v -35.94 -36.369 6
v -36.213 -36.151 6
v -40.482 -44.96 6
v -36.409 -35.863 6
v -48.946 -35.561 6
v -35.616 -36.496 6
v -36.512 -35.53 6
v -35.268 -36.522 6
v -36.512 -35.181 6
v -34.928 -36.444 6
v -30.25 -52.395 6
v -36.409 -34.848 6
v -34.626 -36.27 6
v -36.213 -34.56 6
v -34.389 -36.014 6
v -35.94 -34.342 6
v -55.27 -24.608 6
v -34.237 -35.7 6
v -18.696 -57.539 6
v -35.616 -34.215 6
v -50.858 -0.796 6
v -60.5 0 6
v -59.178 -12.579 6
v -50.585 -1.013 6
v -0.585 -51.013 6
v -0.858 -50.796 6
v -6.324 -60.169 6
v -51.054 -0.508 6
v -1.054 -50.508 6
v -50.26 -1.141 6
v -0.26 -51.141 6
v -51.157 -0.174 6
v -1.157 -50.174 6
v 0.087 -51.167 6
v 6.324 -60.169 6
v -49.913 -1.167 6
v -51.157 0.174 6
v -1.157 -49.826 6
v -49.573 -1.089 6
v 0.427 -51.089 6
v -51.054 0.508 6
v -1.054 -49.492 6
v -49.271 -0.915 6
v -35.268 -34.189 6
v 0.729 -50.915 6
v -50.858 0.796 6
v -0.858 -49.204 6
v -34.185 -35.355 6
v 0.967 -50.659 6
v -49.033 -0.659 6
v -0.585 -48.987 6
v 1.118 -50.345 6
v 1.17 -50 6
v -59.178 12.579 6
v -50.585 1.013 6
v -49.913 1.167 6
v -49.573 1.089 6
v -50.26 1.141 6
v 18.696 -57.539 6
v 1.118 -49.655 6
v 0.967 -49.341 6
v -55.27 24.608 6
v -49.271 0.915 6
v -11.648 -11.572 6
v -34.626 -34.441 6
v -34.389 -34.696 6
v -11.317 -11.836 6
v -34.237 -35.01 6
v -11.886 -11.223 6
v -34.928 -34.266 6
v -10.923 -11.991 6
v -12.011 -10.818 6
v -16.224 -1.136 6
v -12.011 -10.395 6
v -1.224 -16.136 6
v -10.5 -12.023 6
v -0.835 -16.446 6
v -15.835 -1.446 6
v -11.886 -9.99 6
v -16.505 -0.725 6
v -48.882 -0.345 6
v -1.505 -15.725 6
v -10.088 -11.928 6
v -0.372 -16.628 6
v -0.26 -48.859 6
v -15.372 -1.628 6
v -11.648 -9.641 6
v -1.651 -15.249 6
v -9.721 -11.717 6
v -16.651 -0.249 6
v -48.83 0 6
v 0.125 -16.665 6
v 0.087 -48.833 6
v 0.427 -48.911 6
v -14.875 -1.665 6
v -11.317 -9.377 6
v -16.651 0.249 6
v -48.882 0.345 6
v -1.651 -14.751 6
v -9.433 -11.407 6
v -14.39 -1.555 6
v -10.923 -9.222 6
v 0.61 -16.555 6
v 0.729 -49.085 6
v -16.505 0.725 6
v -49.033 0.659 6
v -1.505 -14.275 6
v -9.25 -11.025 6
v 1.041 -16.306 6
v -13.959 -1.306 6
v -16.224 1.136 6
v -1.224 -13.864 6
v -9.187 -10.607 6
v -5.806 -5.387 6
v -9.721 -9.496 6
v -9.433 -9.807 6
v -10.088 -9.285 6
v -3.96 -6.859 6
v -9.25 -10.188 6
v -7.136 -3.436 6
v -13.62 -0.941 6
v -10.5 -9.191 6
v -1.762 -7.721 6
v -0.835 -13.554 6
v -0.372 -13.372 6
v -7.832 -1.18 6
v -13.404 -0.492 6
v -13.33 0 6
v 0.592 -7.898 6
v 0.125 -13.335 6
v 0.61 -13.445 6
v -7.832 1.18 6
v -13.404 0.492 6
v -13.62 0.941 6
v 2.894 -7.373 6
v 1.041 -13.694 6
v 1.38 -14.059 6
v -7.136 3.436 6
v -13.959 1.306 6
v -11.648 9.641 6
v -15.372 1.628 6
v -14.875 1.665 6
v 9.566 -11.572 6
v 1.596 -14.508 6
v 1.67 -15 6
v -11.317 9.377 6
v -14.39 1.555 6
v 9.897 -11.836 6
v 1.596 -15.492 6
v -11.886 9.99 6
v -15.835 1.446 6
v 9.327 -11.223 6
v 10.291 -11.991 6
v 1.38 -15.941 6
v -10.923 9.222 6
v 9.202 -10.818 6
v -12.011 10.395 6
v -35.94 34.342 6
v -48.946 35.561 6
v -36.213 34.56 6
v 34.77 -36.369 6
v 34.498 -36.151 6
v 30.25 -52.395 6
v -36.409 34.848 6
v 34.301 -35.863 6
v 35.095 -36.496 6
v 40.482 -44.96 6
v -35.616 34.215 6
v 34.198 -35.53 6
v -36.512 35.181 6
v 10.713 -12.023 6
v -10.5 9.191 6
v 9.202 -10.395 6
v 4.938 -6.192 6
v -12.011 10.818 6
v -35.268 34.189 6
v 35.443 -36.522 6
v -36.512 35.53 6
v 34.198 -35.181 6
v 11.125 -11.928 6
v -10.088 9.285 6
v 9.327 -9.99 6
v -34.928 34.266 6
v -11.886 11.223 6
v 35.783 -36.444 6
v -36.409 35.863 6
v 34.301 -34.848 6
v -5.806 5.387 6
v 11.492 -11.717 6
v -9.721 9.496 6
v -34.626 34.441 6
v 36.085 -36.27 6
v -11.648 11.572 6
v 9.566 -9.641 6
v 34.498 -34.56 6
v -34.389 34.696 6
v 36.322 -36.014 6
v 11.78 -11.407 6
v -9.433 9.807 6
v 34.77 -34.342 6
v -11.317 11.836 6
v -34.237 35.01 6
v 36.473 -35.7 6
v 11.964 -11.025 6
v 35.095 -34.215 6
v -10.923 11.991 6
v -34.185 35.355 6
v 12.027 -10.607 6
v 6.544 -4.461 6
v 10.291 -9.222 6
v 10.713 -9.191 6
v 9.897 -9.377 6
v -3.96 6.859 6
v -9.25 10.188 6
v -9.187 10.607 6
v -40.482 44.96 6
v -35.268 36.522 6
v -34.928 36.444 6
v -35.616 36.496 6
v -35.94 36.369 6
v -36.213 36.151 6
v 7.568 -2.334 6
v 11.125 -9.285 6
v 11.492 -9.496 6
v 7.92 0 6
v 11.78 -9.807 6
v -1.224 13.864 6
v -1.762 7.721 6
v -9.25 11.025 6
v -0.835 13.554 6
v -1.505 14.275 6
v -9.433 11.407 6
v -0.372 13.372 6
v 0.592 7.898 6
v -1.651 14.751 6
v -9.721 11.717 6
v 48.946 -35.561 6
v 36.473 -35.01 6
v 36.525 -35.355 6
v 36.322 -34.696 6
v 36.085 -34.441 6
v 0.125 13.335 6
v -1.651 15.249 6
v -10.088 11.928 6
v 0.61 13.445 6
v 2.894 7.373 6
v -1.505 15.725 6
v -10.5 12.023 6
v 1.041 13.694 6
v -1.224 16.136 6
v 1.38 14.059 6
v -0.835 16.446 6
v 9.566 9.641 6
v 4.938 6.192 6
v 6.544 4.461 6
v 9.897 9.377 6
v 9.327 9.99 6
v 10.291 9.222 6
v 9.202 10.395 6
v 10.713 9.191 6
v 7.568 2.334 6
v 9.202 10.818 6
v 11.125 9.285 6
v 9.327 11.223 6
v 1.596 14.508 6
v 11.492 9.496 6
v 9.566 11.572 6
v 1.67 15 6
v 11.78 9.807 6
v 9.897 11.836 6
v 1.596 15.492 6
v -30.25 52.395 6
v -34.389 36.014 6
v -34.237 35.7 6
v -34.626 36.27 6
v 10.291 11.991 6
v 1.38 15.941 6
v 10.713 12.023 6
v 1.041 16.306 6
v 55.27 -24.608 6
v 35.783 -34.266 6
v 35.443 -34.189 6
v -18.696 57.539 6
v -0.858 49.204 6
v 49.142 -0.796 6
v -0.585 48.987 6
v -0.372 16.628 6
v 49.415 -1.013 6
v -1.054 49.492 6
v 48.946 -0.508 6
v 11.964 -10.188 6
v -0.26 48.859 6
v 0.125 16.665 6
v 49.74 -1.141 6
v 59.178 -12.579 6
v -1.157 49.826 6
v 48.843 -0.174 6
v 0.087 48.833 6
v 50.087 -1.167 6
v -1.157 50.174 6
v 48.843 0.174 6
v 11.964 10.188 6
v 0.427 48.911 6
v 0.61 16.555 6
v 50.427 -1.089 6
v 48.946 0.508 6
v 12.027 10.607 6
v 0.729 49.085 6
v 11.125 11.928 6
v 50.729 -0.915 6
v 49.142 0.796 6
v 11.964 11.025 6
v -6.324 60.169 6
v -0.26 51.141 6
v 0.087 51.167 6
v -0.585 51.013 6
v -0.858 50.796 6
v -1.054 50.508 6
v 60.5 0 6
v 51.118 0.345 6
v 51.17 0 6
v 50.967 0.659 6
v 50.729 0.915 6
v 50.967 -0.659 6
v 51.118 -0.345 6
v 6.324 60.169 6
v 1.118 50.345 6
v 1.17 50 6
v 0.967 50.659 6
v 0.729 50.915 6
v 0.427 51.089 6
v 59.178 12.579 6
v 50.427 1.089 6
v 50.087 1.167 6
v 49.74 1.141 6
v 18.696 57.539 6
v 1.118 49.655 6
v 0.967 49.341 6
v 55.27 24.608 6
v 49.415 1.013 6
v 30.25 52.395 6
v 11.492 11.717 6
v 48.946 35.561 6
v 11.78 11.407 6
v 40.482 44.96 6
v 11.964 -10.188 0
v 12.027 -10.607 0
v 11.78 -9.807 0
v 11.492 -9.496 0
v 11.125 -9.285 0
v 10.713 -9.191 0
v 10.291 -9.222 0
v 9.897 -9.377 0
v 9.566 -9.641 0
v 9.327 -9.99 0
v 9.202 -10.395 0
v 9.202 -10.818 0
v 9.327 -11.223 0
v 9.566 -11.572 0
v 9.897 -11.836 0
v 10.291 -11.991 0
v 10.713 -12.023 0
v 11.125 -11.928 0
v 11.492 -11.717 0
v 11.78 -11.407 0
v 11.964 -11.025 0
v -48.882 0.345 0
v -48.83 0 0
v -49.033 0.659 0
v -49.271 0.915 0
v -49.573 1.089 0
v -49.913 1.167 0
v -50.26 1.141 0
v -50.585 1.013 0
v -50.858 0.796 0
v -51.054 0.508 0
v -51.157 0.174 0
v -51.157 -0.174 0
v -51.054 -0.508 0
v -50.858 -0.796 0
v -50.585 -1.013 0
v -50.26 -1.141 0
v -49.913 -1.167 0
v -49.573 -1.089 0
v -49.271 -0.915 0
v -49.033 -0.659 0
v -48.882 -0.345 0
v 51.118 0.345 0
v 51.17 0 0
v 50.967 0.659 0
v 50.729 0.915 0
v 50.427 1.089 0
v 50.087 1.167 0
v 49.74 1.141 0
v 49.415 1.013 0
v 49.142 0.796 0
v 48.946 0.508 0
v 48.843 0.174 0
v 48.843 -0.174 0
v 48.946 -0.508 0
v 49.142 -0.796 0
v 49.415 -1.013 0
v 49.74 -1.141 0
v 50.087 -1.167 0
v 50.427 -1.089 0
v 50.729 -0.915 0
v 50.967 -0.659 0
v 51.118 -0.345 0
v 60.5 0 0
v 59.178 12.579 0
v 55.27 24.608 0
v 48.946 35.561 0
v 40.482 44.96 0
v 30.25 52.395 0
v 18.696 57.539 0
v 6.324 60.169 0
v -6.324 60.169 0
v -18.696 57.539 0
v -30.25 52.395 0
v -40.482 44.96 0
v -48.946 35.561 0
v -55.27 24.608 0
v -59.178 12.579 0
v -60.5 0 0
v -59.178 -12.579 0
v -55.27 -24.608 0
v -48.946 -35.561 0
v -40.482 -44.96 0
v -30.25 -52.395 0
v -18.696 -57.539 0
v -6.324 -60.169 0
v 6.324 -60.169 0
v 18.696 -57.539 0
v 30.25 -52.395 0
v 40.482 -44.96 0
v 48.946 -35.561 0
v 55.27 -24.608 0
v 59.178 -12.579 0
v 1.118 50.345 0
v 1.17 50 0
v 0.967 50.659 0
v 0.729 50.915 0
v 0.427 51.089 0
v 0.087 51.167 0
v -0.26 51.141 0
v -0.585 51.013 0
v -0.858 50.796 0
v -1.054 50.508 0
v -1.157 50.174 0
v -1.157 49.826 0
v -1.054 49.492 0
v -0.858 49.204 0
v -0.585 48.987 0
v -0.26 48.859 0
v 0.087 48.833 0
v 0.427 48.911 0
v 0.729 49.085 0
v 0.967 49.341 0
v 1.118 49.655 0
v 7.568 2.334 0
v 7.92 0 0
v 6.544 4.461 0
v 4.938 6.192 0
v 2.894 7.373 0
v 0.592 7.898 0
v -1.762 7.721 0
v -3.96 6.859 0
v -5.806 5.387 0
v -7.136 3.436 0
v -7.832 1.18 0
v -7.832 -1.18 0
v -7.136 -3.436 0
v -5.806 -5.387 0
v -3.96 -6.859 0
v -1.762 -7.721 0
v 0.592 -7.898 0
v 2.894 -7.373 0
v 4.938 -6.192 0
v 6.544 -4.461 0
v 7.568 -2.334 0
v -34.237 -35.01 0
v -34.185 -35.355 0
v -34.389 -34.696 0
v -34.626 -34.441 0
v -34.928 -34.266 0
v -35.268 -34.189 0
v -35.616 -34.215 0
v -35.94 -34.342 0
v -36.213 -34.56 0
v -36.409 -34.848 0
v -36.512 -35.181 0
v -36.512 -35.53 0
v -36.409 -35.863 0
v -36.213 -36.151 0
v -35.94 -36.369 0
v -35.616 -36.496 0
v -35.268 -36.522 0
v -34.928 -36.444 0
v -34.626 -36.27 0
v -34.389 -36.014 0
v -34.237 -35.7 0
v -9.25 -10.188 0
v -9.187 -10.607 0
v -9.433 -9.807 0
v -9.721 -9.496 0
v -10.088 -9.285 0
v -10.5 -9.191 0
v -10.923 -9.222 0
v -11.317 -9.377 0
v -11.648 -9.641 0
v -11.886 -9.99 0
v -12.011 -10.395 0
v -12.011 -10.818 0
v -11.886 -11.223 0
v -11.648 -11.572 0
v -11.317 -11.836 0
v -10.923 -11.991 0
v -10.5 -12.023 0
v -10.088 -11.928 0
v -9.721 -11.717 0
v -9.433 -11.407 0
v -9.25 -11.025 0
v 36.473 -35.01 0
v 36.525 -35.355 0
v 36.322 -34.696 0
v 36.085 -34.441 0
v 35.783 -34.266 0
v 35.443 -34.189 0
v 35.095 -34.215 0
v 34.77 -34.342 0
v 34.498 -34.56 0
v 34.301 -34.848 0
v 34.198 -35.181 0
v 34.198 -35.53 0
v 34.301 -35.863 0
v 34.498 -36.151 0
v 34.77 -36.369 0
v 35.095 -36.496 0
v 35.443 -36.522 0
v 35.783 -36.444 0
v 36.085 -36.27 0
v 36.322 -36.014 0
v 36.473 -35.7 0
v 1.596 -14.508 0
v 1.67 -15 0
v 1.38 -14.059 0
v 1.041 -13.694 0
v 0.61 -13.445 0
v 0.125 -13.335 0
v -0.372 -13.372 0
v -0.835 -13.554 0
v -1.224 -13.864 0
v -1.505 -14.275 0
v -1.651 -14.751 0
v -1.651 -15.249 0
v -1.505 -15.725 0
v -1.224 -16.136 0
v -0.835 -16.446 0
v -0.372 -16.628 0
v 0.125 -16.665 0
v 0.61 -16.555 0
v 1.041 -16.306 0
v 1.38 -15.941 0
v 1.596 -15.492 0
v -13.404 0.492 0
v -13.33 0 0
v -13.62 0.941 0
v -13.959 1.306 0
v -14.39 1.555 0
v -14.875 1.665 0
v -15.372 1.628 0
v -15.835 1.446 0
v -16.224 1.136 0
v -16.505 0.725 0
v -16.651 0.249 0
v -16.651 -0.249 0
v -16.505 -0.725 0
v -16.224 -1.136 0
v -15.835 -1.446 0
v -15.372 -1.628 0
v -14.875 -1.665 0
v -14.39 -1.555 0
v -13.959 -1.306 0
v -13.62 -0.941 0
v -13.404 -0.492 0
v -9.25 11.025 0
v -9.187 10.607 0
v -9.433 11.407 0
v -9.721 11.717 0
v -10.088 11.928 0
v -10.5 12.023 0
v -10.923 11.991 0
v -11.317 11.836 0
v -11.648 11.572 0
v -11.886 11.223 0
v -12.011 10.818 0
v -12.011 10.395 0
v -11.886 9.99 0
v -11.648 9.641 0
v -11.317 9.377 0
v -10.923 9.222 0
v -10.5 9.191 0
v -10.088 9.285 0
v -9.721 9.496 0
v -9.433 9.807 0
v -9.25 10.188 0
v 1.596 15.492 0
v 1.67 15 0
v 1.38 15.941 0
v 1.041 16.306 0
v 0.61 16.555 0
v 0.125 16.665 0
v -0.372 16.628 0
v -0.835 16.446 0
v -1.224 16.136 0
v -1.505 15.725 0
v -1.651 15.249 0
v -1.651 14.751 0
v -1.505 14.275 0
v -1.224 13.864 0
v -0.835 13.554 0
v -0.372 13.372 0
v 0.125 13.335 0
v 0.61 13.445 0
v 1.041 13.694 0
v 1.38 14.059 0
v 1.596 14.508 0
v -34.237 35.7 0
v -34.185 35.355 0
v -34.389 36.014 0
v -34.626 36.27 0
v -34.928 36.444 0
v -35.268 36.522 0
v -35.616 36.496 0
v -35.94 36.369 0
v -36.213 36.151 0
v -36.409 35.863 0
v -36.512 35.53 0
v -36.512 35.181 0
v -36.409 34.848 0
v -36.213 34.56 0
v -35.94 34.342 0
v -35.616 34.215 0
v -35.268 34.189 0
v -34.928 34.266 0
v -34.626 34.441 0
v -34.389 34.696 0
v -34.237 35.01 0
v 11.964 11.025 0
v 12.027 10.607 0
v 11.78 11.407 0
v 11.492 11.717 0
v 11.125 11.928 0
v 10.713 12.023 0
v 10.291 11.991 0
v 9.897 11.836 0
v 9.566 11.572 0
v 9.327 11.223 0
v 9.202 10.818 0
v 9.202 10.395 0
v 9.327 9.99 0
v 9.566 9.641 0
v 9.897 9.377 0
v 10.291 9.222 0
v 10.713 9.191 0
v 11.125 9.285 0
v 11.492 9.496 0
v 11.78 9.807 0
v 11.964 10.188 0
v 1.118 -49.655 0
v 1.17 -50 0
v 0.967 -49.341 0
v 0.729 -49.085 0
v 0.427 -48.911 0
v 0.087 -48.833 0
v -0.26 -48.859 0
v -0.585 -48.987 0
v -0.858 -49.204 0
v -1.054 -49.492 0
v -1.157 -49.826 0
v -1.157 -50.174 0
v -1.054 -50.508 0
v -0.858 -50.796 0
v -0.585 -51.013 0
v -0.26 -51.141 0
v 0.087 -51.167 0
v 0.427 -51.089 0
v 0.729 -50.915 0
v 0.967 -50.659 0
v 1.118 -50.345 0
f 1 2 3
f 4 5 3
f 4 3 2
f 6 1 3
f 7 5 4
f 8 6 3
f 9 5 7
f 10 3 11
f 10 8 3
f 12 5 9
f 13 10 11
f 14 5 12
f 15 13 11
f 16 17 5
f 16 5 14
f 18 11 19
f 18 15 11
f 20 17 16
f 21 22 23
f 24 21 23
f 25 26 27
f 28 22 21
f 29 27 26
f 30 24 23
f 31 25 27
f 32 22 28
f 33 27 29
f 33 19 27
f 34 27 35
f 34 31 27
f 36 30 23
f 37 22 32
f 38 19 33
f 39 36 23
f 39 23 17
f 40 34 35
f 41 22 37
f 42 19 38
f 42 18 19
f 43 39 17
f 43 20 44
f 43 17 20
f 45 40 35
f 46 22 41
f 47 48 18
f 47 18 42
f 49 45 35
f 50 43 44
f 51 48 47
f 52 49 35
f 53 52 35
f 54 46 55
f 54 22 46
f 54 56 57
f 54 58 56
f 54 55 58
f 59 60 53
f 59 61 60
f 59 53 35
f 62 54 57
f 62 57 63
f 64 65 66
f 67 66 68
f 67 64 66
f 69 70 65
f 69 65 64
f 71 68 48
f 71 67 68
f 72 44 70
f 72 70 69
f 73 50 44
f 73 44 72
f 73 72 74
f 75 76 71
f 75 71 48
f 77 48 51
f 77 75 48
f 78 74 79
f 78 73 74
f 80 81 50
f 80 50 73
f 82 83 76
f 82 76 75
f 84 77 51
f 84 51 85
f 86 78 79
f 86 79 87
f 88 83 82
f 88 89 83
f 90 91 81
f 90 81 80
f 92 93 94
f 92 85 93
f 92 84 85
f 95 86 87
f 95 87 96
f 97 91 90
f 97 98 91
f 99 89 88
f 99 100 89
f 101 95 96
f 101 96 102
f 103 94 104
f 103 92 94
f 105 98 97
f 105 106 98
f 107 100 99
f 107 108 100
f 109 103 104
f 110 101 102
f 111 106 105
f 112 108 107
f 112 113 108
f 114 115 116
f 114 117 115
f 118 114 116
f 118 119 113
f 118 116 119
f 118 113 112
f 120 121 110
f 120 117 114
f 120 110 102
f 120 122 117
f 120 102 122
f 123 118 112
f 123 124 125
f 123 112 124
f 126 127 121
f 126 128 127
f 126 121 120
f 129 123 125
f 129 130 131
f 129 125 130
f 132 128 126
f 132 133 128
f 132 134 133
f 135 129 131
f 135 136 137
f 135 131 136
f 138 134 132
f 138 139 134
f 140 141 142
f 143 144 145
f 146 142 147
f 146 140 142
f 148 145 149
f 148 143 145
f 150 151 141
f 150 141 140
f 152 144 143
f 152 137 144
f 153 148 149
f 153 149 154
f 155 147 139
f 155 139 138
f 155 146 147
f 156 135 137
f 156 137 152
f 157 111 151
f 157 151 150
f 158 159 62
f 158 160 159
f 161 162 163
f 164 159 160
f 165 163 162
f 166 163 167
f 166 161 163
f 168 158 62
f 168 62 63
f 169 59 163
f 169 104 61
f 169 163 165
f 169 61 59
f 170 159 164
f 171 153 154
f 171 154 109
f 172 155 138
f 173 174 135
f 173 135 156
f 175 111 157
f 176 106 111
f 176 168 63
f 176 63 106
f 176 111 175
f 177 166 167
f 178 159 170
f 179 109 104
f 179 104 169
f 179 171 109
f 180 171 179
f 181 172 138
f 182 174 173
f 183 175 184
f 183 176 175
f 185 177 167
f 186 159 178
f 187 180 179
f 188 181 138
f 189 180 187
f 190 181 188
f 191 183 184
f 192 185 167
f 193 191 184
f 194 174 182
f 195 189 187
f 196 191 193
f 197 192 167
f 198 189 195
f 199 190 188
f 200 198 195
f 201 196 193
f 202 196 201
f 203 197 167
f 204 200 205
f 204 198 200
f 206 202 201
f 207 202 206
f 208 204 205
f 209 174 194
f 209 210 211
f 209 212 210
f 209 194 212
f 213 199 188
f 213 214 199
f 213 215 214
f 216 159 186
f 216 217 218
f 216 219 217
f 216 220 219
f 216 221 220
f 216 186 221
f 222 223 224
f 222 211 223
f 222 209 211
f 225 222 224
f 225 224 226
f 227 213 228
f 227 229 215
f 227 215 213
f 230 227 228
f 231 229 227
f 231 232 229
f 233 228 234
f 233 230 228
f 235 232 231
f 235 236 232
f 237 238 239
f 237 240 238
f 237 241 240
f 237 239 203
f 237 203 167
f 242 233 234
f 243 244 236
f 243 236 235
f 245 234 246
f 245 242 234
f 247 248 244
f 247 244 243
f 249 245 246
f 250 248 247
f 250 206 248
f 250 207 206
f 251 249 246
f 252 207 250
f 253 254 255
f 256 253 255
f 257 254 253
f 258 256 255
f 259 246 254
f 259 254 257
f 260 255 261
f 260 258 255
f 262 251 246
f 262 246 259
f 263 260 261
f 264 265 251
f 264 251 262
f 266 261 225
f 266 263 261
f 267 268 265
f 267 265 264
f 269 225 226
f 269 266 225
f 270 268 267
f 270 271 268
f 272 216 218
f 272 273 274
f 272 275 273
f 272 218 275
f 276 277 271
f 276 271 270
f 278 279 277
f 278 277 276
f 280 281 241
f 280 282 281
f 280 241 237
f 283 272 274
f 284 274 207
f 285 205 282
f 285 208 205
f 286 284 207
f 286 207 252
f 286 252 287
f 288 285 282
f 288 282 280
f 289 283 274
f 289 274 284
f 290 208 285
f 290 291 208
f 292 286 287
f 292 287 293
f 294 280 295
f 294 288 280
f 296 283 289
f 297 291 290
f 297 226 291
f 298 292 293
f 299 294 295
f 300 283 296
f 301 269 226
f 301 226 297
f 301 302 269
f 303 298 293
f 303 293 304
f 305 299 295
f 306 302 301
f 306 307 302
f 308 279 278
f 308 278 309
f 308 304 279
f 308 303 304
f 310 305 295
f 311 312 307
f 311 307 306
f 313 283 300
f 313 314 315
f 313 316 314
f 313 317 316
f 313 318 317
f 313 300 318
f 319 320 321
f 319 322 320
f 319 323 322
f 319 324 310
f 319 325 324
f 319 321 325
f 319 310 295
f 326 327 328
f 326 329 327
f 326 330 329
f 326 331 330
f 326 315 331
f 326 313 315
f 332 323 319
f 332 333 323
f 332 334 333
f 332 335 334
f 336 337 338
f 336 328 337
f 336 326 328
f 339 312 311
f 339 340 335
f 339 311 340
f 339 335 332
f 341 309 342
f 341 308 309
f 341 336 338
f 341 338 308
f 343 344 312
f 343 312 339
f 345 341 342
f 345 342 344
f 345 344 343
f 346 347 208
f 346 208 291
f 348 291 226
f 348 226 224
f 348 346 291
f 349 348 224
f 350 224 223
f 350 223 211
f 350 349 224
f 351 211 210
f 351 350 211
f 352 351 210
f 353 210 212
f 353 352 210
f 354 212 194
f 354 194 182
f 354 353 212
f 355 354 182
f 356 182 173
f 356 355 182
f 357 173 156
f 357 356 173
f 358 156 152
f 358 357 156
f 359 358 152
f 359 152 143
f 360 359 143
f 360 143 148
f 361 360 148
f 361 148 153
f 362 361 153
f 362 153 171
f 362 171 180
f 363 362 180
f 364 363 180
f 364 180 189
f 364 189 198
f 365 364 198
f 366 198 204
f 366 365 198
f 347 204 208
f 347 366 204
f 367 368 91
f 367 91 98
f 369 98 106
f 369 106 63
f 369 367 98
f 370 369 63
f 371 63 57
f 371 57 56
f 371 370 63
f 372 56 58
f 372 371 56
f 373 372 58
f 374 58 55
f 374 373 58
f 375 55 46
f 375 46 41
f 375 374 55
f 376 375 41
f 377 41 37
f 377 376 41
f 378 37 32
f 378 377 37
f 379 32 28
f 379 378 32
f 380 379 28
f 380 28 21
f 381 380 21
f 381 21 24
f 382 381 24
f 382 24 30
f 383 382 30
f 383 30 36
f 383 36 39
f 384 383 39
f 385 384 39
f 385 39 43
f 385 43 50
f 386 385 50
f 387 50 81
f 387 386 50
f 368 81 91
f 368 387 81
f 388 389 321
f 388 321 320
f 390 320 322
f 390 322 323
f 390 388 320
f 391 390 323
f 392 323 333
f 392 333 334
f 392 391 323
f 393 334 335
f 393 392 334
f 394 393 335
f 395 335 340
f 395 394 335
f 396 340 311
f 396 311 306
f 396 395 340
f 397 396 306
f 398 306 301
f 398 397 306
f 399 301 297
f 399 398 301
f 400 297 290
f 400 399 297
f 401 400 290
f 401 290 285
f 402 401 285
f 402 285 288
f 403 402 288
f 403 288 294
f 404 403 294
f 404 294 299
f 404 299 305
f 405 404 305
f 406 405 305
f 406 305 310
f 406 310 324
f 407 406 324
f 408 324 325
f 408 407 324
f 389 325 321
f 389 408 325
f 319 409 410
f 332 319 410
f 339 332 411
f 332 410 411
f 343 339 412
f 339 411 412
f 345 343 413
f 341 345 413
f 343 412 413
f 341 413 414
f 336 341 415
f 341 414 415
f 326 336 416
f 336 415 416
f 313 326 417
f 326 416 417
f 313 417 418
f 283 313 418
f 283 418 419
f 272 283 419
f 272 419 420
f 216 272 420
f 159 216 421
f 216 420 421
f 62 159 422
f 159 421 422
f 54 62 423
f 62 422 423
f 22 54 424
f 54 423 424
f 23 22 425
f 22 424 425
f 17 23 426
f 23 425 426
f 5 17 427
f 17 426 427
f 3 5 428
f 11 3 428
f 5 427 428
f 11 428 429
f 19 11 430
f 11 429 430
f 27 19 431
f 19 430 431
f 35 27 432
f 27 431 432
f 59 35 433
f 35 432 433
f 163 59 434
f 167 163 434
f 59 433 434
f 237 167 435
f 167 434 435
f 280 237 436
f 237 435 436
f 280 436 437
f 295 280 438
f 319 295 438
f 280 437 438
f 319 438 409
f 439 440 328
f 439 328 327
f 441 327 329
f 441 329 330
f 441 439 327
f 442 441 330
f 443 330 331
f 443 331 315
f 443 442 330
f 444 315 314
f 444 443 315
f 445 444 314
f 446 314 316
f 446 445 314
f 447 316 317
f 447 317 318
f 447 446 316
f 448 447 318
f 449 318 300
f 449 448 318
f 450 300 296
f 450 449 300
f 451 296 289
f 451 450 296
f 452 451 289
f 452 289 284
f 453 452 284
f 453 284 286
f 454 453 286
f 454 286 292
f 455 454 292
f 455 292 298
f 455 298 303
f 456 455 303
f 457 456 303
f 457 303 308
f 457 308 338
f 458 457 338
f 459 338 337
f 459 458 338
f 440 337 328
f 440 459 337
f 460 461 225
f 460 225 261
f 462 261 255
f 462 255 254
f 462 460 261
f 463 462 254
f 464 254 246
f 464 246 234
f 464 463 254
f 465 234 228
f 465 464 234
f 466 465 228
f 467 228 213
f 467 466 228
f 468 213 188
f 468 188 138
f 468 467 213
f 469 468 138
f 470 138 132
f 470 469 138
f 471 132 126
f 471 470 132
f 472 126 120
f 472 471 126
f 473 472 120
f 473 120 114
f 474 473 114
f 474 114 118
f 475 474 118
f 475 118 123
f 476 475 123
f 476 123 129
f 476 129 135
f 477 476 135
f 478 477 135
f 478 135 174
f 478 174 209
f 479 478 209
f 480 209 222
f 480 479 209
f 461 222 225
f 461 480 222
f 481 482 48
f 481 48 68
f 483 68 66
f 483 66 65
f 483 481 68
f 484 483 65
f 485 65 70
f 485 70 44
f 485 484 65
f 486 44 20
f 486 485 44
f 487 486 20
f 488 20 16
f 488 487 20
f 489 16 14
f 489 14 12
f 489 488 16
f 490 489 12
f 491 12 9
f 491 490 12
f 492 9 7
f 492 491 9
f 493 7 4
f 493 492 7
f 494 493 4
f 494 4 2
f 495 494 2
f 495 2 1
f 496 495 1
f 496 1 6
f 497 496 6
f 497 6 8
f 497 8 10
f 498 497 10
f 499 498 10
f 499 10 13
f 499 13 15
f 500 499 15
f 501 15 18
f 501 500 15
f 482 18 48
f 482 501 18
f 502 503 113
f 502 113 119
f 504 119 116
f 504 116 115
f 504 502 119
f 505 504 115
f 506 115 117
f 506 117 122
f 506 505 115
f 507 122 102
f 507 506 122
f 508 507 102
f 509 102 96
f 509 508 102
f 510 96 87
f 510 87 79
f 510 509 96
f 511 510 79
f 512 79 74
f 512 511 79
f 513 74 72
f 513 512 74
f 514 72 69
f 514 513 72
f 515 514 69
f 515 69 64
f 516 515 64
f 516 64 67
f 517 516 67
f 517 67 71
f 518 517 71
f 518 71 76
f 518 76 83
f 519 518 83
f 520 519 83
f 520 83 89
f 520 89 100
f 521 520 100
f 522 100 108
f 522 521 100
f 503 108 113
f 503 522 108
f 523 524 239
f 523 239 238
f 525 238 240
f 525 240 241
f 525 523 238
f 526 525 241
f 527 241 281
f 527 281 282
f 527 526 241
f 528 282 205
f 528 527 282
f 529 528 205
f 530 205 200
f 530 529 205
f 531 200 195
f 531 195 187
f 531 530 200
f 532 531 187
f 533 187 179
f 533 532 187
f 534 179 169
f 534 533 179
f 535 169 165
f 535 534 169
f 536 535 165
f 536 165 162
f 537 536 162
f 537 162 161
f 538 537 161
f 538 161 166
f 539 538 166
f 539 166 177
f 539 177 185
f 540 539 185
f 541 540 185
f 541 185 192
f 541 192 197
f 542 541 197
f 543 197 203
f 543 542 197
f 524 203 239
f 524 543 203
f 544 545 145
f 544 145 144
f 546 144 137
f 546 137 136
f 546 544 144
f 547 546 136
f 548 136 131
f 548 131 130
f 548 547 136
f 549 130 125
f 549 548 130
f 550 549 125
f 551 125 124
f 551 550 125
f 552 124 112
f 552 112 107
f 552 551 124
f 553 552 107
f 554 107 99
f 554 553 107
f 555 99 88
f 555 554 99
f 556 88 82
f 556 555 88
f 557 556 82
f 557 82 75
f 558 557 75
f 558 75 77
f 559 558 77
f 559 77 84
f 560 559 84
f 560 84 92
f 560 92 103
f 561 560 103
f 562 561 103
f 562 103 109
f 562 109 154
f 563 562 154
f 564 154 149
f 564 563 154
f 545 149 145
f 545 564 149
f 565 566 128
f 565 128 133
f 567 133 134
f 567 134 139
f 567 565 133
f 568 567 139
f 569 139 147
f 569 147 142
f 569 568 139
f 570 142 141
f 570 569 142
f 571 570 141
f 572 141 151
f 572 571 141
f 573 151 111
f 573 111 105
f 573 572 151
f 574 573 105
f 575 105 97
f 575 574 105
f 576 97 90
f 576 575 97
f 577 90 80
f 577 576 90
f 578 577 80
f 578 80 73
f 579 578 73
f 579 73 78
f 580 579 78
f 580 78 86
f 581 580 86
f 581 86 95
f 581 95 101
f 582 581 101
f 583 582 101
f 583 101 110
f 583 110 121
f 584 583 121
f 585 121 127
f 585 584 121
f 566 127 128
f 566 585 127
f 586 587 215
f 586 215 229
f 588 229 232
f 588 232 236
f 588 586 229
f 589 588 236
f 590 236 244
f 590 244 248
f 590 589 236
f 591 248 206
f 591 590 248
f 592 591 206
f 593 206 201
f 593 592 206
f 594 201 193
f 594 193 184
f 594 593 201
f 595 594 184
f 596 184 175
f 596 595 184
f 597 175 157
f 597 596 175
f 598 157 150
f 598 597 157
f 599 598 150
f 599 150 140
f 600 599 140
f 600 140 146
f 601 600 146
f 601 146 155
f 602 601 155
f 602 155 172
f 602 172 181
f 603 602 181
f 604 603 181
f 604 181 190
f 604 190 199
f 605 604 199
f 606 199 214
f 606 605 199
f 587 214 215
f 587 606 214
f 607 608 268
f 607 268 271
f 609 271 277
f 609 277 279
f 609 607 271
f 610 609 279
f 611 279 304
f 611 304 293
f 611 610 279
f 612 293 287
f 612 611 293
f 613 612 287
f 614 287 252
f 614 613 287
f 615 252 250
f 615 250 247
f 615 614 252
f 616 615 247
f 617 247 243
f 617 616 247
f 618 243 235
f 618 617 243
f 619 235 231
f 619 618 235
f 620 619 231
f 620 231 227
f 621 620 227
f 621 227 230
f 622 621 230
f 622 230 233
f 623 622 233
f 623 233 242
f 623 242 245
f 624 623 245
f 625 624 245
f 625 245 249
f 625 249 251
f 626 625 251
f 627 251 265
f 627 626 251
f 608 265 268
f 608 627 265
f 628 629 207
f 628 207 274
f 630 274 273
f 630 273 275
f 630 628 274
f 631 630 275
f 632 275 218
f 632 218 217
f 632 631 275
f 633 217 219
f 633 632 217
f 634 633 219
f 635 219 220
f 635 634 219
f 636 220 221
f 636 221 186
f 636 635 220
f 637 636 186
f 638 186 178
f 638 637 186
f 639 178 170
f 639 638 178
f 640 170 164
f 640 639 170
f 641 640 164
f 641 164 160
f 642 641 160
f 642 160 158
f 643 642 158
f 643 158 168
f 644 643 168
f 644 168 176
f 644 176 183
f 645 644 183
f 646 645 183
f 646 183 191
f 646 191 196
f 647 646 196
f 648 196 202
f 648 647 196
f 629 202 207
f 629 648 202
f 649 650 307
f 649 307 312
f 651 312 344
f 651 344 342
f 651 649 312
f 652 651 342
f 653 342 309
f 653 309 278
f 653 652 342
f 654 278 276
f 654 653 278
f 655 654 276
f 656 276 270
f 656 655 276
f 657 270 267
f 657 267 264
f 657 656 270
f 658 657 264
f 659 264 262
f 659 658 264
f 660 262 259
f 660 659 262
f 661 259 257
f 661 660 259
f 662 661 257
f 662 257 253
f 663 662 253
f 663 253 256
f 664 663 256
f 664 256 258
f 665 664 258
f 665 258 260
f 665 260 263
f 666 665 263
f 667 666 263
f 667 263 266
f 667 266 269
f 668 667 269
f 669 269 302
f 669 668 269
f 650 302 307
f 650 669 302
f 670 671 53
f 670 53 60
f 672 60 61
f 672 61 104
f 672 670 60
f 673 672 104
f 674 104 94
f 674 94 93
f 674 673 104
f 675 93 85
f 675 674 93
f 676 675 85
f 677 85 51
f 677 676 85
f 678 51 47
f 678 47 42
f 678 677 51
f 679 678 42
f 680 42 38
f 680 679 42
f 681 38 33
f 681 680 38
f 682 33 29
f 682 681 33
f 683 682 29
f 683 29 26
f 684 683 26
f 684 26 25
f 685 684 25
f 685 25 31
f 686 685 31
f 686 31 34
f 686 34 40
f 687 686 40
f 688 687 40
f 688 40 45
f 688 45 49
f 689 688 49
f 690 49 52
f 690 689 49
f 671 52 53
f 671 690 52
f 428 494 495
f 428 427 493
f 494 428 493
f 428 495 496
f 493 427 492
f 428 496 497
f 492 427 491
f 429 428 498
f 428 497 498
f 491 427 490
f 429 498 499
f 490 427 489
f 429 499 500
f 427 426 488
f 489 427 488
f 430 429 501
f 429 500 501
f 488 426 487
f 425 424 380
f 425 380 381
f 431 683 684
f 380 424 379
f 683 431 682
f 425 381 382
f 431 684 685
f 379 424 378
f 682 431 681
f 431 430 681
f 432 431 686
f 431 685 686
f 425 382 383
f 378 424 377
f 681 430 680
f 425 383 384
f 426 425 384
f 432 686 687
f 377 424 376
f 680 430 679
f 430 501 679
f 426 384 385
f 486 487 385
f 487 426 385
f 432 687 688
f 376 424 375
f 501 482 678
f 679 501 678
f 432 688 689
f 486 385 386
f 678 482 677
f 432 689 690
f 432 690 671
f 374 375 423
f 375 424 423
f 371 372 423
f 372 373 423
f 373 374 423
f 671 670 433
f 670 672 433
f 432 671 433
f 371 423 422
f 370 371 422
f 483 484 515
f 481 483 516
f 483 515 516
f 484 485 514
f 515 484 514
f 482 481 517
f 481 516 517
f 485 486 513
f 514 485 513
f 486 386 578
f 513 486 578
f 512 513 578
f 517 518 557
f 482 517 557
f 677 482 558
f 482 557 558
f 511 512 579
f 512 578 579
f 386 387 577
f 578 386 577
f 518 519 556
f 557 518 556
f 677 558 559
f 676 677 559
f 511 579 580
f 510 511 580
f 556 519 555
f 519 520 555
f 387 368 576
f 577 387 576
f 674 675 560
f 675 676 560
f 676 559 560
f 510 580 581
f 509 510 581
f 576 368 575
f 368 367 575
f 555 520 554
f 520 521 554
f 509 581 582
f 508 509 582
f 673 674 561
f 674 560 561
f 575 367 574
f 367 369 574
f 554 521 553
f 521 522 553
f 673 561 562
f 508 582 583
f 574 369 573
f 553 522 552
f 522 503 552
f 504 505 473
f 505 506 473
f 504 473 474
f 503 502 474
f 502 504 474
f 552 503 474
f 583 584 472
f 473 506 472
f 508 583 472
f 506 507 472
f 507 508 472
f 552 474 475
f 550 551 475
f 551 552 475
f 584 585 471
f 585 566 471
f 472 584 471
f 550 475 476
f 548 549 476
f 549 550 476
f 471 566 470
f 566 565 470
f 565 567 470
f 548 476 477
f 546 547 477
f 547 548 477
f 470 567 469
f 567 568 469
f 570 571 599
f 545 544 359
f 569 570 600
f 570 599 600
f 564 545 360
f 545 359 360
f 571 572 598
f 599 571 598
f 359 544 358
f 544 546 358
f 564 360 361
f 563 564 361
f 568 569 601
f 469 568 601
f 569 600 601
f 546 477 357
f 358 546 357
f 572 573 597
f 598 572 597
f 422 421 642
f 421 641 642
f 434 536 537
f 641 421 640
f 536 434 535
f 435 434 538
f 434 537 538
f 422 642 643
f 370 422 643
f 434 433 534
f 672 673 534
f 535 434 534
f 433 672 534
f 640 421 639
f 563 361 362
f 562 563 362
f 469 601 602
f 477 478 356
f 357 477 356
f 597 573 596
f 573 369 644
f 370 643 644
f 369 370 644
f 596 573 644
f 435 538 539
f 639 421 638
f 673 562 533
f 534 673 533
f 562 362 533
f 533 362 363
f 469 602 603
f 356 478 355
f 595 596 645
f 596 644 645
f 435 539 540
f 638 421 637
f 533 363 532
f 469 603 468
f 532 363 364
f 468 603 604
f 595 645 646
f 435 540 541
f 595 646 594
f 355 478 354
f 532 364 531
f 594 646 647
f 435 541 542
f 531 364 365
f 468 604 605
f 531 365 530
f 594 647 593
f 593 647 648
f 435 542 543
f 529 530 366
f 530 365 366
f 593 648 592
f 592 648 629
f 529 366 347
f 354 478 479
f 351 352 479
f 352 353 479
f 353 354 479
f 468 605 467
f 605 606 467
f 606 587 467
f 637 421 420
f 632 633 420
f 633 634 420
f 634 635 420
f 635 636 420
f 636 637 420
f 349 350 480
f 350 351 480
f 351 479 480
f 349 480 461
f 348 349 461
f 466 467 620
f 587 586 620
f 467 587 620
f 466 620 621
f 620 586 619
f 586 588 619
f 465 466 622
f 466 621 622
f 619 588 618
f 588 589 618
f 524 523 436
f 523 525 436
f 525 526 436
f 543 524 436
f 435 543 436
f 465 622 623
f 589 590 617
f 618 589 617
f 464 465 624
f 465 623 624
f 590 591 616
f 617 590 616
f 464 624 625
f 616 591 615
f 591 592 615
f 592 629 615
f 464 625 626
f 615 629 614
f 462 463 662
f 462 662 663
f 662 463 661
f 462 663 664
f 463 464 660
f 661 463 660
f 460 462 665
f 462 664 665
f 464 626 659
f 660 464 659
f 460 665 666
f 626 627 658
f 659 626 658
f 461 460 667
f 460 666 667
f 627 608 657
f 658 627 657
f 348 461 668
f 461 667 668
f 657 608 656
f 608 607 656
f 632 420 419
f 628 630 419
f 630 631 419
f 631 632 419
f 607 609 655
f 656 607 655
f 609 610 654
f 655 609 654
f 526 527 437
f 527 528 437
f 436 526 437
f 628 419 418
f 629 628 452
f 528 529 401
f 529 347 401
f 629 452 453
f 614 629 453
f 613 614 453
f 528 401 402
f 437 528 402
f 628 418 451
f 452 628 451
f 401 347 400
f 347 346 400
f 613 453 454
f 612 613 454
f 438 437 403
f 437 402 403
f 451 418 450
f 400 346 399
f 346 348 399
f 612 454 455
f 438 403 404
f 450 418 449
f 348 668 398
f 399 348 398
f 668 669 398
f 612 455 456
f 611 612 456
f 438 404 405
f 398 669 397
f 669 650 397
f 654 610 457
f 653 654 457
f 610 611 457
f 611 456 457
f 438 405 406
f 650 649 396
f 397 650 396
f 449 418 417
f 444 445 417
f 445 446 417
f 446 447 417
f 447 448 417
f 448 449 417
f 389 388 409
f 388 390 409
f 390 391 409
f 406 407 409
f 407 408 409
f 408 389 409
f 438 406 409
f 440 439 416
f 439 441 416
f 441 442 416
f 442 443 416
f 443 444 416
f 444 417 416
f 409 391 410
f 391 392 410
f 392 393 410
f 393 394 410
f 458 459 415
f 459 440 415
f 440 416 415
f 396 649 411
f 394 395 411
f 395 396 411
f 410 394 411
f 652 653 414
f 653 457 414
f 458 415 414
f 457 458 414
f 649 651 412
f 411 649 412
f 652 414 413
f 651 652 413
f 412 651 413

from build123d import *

# Parameters (mm, degrees)
SKETCH1_R           = 60.5
SKETCH1_R_2         = 1.25
SKETCH1_R_3         = 8
SKETCH1_R_4         = 1.75
SKETCH1_R_5         = 1.5
BOSS_EXTRUDE1_DEPTH = 6
MOVE_FACE1_BY       = 0.08
MOVE_FACE1_2_BY     = 0.08
MOVE_FACE1_3_BY     = 0.08
MOVE_FACE1_4_BY     = 0.08
MOVE_FACE1_5_BY     = 0.08
MOVE_FACE1_6_BY     = 0.08
MOVE_FACE1_7_BY     = 0.08
MOVE_FACE1_8_BY     = 0.08
MOVE_FACE1_9_BY     = 0.08
MOVE_FACE1_10_BY    = 0.08
MOVE_FACE1_11_BY    = 0.08
MOVE_FACE1_12_BY    = 0.08
MOVE_FACE1_13_BY    = 0.08
MOVE_FACE1_14_BY    = 0.08
MOVE_FACE1_15_BY    = 0.08


with BuildPart() as part:
    # Sketch1 → Boss-Extrude1 (new body)
    with BuildSketch(Plane.XY):
        Circle(SKETCH1_R)
        with Locations((35.355339059, -35.355339059)):
            Circle(SKETCH1_R_2, mode=Mode.SUBTRACT)
        Circle(SKETCH1_R_3, mode=Mode.SUBTRACT)
        with Locations((0, -15)):
            Circle(SKETCH1_R_4, mode=Mode.SUBTRACT)
        with Locations((10.606601718, -10.606601718)):
            Circle(SKETCH1_R_5, mode=Mode.SUBTRACT)
        with Locations((0, -50)):
            Circle(SKETCH1_R_2, mode=Mode.SUBTRACT)
        with Locations((-15, 0)):
            Circle(SKETCH1_R_4, mode=Mode.SUBTRACT)
        with Locations((-10.606601718, -10.606601718)):
            Circle(SKETCH1_R_5, mode=Mode.SUBTRACT)
        with Locations((0, 15)):
            Circle(SKETCH1_R_4, mode=Mode.SUBTRACT)
        with Locations((-10.606601718, 10.606601718)):
            Circle(SKETCH1_R_5, mode=Mode.SUBTRACT)
        with Locations((10.606601718, 10.606601718)):
            Circle(SKETCH1_R_5, mode=Mode.SUBTRACT)
        with Locations((-35.355339059, -35.355339059)):
            Circle(SKETCH1_R_2, mode=Mode.SUBTRACT)
        with Locations((-50, 0)):
            Circle(SKETCH1_R_2, mode=Mode.SUBTRACT)
        with Locations((-35.355339059, 35.355339059)):
            Circle(SKETCH1_R_2, mode=Mode.SUBTRACT)
        with Locations((0, 50)):
            Circle(SKETCH1_R_2, mode=Mode.SUBTRACT)
        with Locations((50, 0)):
            Circle(SKETCH1_R_2, mode=Mode.SUBTRACT)
    extrude(amount=BOSS_EXTRUDE1_DEPTH)

    # Move Face1: a curved face moved outward by 0.08
    add(Solid.thicken(part.faces().sort_by_distance((34.105339059, -35.355339059, 3))[0], MOVE_FACE1_BY))

    # Move Face1 2: a curved face moved outward by 0.08
    add(Solid.thicken(part.faces().sort_by_distance((-8, 0, 3))[0], MOVE_FACE1_2_BY))

    # Move Face1 3: a curved face moved outward by 0.08
    add(Solid.thicken(part.faces().sort_by_distance((-1.75, -15, 3))[0], MOVE_FACE1_3_BY))

    # Move Face1 4: a curved face moved outward by 0.08
    add(Solid.thicken(part.faces().sort_by_distance((9.106601718, -10.606601718, 3))[0], MOVE_FACE1_4_BY))

    # Move Face1 5: a curved face moved outward by 0.08
    add(Solid.thicken(part.faces().sort_by_distance((-1.25, -50, 3))[0], MOVE_FACE1_5_BY))

    # Move Face1 6: a curved face moved outward by 0.08
    add(Solid.thicken(part.faces().sort_by_distance((-36.605339059, -35.355339059, 3))[0], MOVE_FACE1_6_BY))

    # Move Face1 7: a curved face moved outward by 0.08
    add(Solid.thicken(part.faces().sort_by_distance((-16.75, 0, 3))[0], MOVE_FACE1_7_BY))

    # Move Face1 8: a curved face moved outward by 0.08
    add(Solid.thicken(part.faces().sort_by_distance((-12.106601718, -10.606601718, 3))[0], MOVE_FACE1_8_BY))

    # Move Face1 9: a curved face moved outward by 0.08
    add(Solid.thicken(part.faces().sort_by_distance((-1.75, 15, 3))[0], MOVE_FACE1_9_BY))

    # Move Face1 10: a curved face moved outward by 0.08
    add(Solid.thicken(part.faces().sort_by_distance((-12.106601718, 10.606601718, 3))[0], MOVE_FACE1_10_BY))

    # Move Face1 11: a curved face moved outward by 0.08
    add(Solid.thicken(part.faces().sort_by_distance((9.106601718, 10.606601718, 3))[0], MOVE_FACE1_11_BY))

    # Move Face1 12: a curved face moved outward by 0.08
    add(Solid.thicken(part.faces().sort_by_distance((-51.25, 0, 3))[0], MOVE_FACE1_12_BY))

    # Move Face1 13: a curved face moved outward by 0.08
    add(Solid.thicken(part.faces().sort_by_distance((-36.605339059, 35.355339059, 3))[0], MOVE_FACE1_13_BY))

    # Move Face1 14: a curved face moved outward by 0.08
    add(Solid.thicken(part.faces().sort_by_distance((-1.25, 50, 3))[0], MOVE_FACE1_14_BY))

    # Move Face1 15: a curved face moved outward by 0.08
    add(Solid.thicken(part.faces().sort_by_distance((48.75, 0, 3))[0], MOVE_FACE1_15_BY))


solid = part.part
